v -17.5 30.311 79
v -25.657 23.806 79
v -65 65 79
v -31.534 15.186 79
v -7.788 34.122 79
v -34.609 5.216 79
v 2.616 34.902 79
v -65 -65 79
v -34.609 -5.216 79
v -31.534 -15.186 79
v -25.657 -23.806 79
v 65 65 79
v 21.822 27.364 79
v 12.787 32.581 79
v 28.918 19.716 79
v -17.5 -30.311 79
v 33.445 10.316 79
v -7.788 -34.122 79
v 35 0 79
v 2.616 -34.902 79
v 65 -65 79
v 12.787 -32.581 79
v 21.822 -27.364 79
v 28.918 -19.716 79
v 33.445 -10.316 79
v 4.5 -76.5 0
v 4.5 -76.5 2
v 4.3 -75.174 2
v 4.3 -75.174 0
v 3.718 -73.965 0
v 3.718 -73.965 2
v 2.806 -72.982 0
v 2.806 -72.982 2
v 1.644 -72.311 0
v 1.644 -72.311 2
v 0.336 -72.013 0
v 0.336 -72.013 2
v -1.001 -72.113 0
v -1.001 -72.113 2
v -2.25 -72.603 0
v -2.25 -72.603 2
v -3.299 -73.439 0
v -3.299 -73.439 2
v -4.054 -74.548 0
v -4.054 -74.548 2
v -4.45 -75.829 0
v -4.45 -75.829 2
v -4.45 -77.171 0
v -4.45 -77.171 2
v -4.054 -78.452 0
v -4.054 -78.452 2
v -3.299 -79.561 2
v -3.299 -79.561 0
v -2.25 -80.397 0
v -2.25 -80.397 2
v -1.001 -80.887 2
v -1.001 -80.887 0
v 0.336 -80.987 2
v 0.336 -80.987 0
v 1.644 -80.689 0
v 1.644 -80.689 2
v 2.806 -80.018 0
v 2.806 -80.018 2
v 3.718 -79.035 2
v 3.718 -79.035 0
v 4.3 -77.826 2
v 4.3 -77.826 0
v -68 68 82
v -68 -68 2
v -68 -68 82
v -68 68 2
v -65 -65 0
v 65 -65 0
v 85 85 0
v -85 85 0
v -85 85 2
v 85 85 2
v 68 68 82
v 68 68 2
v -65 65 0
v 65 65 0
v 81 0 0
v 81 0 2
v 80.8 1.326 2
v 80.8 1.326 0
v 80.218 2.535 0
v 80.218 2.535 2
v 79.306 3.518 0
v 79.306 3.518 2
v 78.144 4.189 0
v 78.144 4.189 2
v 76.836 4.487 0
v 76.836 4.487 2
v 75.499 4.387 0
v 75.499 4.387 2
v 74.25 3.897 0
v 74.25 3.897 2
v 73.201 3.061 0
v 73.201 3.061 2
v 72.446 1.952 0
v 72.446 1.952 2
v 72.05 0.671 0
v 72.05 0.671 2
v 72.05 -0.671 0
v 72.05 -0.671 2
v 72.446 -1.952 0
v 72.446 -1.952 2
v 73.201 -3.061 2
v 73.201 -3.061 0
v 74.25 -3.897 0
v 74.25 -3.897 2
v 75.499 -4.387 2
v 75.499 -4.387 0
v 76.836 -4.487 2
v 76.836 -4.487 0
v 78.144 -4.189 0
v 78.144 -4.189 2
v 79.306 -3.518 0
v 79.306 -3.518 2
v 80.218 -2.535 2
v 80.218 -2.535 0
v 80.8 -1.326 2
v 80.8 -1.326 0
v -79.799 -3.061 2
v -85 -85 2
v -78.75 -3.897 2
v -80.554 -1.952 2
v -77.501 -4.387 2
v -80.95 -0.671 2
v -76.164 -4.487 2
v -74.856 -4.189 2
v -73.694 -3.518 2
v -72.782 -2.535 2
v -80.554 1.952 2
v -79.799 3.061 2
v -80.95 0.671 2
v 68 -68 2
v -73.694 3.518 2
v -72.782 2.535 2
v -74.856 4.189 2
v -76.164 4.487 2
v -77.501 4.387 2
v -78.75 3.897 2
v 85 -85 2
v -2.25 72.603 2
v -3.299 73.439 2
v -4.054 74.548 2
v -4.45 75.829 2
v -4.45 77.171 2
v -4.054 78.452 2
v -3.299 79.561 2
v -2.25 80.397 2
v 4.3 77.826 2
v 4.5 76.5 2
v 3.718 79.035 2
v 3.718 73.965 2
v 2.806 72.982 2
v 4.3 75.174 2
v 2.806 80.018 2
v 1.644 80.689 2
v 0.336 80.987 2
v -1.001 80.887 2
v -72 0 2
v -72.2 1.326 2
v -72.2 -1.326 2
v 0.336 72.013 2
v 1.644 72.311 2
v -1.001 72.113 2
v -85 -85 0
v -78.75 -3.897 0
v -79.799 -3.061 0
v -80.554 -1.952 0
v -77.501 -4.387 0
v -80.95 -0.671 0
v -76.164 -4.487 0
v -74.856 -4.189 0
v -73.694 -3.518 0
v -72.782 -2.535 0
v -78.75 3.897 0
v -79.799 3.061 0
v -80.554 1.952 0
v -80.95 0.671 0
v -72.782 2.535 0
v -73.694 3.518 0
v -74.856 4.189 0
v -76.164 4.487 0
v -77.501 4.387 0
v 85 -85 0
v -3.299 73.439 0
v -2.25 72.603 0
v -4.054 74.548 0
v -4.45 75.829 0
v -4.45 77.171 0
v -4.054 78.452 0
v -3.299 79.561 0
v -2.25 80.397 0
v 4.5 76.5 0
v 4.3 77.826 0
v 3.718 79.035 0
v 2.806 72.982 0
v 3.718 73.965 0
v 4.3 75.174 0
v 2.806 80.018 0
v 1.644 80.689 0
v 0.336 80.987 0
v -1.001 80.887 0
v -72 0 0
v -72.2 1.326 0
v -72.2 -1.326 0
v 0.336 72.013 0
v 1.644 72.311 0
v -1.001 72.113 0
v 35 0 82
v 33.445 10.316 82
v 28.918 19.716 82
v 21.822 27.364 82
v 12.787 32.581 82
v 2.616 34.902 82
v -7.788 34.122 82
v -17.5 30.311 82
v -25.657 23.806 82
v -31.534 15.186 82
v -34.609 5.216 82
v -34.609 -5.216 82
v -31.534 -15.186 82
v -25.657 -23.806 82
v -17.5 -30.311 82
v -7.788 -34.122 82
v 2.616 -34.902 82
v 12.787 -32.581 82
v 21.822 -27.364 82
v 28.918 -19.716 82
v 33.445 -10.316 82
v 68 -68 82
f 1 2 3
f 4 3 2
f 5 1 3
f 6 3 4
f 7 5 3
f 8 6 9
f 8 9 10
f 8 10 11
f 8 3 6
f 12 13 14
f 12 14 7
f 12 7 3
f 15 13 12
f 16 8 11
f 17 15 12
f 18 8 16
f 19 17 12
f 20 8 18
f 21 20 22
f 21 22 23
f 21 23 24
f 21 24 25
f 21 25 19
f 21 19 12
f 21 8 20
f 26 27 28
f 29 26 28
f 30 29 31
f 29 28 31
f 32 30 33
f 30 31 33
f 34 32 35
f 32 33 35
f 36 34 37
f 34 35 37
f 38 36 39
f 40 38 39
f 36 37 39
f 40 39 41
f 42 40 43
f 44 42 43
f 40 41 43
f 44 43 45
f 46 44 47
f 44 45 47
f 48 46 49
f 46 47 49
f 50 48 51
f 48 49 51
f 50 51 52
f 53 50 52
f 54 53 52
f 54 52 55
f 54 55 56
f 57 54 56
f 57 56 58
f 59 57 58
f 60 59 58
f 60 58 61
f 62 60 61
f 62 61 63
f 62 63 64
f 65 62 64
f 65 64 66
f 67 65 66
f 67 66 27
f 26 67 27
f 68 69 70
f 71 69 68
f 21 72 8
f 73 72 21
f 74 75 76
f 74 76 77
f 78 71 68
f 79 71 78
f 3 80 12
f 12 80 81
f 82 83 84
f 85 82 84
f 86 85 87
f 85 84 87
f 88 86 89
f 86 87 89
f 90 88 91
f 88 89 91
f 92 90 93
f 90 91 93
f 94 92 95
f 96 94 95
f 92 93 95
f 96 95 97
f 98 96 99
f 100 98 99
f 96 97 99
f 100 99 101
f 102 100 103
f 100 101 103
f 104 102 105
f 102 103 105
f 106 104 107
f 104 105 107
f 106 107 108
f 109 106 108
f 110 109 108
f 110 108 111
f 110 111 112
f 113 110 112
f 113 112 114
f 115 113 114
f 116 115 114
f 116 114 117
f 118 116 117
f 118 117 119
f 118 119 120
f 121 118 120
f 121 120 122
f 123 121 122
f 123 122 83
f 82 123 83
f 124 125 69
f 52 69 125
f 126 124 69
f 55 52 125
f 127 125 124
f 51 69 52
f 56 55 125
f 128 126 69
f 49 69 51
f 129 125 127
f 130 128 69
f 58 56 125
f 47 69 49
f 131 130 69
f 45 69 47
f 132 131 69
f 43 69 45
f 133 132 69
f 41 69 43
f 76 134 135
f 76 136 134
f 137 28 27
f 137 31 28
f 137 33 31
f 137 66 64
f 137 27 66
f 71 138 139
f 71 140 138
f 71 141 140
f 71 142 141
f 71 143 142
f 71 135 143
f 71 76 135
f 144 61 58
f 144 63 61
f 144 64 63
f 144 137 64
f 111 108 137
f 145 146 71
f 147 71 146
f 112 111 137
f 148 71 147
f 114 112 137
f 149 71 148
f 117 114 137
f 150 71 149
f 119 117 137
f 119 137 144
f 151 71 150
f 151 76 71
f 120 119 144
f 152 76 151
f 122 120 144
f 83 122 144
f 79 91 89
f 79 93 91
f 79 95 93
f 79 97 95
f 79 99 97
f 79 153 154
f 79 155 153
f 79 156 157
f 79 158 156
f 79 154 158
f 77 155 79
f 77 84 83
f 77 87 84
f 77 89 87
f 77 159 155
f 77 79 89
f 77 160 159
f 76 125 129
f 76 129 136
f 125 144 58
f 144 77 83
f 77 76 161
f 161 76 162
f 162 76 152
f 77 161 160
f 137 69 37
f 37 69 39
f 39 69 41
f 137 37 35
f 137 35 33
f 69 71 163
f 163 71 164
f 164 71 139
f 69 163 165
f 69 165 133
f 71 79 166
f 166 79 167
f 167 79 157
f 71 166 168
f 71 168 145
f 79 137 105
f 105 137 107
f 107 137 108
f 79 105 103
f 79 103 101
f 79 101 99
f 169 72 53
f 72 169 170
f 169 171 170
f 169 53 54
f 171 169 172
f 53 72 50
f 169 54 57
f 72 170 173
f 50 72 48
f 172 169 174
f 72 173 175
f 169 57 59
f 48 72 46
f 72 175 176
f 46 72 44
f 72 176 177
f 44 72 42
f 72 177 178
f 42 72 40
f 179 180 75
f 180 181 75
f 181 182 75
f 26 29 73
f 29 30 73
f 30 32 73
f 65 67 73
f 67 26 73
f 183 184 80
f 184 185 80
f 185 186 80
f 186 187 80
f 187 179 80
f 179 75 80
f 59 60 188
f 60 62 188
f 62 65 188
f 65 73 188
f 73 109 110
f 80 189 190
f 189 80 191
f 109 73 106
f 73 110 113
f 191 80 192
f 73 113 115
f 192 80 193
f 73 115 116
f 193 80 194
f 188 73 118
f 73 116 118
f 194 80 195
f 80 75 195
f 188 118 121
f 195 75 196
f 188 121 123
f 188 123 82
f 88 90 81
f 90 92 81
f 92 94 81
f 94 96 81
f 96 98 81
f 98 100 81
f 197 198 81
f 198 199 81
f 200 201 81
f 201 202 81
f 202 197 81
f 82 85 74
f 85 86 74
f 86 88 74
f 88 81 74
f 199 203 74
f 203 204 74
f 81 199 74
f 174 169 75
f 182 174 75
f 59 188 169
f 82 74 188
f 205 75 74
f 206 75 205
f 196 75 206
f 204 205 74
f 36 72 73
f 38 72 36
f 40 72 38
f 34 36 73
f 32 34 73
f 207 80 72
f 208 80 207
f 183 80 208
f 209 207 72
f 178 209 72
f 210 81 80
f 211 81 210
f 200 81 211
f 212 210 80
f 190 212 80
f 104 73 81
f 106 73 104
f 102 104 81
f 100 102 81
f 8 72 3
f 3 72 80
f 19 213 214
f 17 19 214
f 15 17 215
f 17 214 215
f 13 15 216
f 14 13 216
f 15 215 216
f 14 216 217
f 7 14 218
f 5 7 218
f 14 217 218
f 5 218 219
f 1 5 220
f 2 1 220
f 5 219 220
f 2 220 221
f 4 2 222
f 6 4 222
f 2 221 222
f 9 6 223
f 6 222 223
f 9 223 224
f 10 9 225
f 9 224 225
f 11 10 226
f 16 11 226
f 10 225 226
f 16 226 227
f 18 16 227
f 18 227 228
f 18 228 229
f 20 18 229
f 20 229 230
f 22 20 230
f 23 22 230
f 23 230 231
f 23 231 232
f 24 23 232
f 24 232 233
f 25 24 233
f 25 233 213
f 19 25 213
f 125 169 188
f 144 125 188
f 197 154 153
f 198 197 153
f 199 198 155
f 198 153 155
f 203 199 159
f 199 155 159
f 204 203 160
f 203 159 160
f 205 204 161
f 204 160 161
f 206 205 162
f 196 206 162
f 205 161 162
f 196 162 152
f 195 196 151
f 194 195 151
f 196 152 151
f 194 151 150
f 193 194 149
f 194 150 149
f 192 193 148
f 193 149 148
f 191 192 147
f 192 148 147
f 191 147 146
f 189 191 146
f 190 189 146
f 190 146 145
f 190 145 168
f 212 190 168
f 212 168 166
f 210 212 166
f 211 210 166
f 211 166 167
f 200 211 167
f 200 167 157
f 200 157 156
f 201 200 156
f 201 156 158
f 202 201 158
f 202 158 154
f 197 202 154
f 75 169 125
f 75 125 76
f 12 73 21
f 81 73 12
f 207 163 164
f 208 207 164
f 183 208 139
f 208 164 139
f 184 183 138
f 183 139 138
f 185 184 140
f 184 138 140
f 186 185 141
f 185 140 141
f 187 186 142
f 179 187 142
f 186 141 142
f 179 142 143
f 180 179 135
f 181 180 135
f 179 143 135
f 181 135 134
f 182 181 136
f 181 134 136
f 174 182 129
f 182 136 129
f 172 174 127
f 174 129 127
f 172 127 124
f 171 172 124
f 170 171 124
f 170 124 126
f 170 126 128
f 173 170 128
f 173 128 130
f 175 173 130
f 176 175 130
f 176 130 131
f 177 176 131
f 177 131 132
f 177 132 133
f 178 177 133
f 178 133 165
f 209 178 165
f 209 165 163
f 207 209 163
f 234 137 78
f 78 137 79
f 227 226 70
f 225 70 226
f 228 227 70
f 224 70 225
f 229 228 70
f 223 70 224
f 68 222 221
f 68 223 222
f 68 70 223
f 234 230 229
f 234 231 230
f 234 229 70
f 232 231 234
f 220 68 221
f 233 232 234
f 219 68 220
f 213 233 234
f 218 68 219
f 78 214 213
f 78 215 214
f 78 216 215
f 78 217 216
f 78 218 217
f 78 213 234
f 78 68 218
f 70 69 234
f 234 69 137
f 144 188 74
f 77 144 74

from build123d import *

# Parameters (mm, degrees)
F0_W     = 170
F0_H     = 170
F0_W_2   = 130
F0_H_2   = 130
F1_DEPTH = 2
F2_W     = 136
F2_H     = 136
F3_DEPTH = 80
F4_W     = 130
F4_H     = 130
F5_DEPTH = 77
F6_R     = 35
F7_DEPTH = 82.001
F8_R     = 4.5
F9_DEPTH = 2.001


with BuildPart() as f1:
    # F0 (on Top) → F1 (new body)
    with BuildSketch(Plane.XY):
        Rectangle(F0_W, F0_H)
        Rectangle(F0_W_2, F0_H_2, mode=Mode.SUBTRACT)
    extrude(amount=F1_DEPTH)

    # F2 (on face) → F3 (join)
    with BuildSketch(Plane.XY.offset(2)):
        Rectangle(F2_W, F2_H)
    extrude(amount=F3_DEPTH)

    # F4 (on face) → F5 (cut)
    with BuildSketch(Plane(origin=(0, 0, 2), x_dir=(1, 0, 0), z_dir=(0, 0, -1))):
        Rectangle(F4_W, F4_H)
    extrude(amount=-F5_DEPTH, mode=Mode.SUBTRACT)

    # F6 (on face) → F7 (cut, through all)
    with BuildSketch(Plane.XY.offset(82)):
        Circle(F6_R)
    extrude(amount=-F7_DEPTH, mode=Mode.SUBTRACT)

    # F8 (on face) → F9 (cut, through all)
    with BuildSketch(Plane.XY.offset(2)):
        with Locations((0, 76.5)):
            Circle(F8_R)
        with Locations((-76.5, 0)):
            Circle(F8_R)
        with Locations((76.5, 0)):
            Circle(F8_R)
        with Locations((0, -76.5)):
            Circle(F8_R)
    extrude(amount=-F9_DEPTH, mode=Mode.SUBTRACT)


solid = f1.part
